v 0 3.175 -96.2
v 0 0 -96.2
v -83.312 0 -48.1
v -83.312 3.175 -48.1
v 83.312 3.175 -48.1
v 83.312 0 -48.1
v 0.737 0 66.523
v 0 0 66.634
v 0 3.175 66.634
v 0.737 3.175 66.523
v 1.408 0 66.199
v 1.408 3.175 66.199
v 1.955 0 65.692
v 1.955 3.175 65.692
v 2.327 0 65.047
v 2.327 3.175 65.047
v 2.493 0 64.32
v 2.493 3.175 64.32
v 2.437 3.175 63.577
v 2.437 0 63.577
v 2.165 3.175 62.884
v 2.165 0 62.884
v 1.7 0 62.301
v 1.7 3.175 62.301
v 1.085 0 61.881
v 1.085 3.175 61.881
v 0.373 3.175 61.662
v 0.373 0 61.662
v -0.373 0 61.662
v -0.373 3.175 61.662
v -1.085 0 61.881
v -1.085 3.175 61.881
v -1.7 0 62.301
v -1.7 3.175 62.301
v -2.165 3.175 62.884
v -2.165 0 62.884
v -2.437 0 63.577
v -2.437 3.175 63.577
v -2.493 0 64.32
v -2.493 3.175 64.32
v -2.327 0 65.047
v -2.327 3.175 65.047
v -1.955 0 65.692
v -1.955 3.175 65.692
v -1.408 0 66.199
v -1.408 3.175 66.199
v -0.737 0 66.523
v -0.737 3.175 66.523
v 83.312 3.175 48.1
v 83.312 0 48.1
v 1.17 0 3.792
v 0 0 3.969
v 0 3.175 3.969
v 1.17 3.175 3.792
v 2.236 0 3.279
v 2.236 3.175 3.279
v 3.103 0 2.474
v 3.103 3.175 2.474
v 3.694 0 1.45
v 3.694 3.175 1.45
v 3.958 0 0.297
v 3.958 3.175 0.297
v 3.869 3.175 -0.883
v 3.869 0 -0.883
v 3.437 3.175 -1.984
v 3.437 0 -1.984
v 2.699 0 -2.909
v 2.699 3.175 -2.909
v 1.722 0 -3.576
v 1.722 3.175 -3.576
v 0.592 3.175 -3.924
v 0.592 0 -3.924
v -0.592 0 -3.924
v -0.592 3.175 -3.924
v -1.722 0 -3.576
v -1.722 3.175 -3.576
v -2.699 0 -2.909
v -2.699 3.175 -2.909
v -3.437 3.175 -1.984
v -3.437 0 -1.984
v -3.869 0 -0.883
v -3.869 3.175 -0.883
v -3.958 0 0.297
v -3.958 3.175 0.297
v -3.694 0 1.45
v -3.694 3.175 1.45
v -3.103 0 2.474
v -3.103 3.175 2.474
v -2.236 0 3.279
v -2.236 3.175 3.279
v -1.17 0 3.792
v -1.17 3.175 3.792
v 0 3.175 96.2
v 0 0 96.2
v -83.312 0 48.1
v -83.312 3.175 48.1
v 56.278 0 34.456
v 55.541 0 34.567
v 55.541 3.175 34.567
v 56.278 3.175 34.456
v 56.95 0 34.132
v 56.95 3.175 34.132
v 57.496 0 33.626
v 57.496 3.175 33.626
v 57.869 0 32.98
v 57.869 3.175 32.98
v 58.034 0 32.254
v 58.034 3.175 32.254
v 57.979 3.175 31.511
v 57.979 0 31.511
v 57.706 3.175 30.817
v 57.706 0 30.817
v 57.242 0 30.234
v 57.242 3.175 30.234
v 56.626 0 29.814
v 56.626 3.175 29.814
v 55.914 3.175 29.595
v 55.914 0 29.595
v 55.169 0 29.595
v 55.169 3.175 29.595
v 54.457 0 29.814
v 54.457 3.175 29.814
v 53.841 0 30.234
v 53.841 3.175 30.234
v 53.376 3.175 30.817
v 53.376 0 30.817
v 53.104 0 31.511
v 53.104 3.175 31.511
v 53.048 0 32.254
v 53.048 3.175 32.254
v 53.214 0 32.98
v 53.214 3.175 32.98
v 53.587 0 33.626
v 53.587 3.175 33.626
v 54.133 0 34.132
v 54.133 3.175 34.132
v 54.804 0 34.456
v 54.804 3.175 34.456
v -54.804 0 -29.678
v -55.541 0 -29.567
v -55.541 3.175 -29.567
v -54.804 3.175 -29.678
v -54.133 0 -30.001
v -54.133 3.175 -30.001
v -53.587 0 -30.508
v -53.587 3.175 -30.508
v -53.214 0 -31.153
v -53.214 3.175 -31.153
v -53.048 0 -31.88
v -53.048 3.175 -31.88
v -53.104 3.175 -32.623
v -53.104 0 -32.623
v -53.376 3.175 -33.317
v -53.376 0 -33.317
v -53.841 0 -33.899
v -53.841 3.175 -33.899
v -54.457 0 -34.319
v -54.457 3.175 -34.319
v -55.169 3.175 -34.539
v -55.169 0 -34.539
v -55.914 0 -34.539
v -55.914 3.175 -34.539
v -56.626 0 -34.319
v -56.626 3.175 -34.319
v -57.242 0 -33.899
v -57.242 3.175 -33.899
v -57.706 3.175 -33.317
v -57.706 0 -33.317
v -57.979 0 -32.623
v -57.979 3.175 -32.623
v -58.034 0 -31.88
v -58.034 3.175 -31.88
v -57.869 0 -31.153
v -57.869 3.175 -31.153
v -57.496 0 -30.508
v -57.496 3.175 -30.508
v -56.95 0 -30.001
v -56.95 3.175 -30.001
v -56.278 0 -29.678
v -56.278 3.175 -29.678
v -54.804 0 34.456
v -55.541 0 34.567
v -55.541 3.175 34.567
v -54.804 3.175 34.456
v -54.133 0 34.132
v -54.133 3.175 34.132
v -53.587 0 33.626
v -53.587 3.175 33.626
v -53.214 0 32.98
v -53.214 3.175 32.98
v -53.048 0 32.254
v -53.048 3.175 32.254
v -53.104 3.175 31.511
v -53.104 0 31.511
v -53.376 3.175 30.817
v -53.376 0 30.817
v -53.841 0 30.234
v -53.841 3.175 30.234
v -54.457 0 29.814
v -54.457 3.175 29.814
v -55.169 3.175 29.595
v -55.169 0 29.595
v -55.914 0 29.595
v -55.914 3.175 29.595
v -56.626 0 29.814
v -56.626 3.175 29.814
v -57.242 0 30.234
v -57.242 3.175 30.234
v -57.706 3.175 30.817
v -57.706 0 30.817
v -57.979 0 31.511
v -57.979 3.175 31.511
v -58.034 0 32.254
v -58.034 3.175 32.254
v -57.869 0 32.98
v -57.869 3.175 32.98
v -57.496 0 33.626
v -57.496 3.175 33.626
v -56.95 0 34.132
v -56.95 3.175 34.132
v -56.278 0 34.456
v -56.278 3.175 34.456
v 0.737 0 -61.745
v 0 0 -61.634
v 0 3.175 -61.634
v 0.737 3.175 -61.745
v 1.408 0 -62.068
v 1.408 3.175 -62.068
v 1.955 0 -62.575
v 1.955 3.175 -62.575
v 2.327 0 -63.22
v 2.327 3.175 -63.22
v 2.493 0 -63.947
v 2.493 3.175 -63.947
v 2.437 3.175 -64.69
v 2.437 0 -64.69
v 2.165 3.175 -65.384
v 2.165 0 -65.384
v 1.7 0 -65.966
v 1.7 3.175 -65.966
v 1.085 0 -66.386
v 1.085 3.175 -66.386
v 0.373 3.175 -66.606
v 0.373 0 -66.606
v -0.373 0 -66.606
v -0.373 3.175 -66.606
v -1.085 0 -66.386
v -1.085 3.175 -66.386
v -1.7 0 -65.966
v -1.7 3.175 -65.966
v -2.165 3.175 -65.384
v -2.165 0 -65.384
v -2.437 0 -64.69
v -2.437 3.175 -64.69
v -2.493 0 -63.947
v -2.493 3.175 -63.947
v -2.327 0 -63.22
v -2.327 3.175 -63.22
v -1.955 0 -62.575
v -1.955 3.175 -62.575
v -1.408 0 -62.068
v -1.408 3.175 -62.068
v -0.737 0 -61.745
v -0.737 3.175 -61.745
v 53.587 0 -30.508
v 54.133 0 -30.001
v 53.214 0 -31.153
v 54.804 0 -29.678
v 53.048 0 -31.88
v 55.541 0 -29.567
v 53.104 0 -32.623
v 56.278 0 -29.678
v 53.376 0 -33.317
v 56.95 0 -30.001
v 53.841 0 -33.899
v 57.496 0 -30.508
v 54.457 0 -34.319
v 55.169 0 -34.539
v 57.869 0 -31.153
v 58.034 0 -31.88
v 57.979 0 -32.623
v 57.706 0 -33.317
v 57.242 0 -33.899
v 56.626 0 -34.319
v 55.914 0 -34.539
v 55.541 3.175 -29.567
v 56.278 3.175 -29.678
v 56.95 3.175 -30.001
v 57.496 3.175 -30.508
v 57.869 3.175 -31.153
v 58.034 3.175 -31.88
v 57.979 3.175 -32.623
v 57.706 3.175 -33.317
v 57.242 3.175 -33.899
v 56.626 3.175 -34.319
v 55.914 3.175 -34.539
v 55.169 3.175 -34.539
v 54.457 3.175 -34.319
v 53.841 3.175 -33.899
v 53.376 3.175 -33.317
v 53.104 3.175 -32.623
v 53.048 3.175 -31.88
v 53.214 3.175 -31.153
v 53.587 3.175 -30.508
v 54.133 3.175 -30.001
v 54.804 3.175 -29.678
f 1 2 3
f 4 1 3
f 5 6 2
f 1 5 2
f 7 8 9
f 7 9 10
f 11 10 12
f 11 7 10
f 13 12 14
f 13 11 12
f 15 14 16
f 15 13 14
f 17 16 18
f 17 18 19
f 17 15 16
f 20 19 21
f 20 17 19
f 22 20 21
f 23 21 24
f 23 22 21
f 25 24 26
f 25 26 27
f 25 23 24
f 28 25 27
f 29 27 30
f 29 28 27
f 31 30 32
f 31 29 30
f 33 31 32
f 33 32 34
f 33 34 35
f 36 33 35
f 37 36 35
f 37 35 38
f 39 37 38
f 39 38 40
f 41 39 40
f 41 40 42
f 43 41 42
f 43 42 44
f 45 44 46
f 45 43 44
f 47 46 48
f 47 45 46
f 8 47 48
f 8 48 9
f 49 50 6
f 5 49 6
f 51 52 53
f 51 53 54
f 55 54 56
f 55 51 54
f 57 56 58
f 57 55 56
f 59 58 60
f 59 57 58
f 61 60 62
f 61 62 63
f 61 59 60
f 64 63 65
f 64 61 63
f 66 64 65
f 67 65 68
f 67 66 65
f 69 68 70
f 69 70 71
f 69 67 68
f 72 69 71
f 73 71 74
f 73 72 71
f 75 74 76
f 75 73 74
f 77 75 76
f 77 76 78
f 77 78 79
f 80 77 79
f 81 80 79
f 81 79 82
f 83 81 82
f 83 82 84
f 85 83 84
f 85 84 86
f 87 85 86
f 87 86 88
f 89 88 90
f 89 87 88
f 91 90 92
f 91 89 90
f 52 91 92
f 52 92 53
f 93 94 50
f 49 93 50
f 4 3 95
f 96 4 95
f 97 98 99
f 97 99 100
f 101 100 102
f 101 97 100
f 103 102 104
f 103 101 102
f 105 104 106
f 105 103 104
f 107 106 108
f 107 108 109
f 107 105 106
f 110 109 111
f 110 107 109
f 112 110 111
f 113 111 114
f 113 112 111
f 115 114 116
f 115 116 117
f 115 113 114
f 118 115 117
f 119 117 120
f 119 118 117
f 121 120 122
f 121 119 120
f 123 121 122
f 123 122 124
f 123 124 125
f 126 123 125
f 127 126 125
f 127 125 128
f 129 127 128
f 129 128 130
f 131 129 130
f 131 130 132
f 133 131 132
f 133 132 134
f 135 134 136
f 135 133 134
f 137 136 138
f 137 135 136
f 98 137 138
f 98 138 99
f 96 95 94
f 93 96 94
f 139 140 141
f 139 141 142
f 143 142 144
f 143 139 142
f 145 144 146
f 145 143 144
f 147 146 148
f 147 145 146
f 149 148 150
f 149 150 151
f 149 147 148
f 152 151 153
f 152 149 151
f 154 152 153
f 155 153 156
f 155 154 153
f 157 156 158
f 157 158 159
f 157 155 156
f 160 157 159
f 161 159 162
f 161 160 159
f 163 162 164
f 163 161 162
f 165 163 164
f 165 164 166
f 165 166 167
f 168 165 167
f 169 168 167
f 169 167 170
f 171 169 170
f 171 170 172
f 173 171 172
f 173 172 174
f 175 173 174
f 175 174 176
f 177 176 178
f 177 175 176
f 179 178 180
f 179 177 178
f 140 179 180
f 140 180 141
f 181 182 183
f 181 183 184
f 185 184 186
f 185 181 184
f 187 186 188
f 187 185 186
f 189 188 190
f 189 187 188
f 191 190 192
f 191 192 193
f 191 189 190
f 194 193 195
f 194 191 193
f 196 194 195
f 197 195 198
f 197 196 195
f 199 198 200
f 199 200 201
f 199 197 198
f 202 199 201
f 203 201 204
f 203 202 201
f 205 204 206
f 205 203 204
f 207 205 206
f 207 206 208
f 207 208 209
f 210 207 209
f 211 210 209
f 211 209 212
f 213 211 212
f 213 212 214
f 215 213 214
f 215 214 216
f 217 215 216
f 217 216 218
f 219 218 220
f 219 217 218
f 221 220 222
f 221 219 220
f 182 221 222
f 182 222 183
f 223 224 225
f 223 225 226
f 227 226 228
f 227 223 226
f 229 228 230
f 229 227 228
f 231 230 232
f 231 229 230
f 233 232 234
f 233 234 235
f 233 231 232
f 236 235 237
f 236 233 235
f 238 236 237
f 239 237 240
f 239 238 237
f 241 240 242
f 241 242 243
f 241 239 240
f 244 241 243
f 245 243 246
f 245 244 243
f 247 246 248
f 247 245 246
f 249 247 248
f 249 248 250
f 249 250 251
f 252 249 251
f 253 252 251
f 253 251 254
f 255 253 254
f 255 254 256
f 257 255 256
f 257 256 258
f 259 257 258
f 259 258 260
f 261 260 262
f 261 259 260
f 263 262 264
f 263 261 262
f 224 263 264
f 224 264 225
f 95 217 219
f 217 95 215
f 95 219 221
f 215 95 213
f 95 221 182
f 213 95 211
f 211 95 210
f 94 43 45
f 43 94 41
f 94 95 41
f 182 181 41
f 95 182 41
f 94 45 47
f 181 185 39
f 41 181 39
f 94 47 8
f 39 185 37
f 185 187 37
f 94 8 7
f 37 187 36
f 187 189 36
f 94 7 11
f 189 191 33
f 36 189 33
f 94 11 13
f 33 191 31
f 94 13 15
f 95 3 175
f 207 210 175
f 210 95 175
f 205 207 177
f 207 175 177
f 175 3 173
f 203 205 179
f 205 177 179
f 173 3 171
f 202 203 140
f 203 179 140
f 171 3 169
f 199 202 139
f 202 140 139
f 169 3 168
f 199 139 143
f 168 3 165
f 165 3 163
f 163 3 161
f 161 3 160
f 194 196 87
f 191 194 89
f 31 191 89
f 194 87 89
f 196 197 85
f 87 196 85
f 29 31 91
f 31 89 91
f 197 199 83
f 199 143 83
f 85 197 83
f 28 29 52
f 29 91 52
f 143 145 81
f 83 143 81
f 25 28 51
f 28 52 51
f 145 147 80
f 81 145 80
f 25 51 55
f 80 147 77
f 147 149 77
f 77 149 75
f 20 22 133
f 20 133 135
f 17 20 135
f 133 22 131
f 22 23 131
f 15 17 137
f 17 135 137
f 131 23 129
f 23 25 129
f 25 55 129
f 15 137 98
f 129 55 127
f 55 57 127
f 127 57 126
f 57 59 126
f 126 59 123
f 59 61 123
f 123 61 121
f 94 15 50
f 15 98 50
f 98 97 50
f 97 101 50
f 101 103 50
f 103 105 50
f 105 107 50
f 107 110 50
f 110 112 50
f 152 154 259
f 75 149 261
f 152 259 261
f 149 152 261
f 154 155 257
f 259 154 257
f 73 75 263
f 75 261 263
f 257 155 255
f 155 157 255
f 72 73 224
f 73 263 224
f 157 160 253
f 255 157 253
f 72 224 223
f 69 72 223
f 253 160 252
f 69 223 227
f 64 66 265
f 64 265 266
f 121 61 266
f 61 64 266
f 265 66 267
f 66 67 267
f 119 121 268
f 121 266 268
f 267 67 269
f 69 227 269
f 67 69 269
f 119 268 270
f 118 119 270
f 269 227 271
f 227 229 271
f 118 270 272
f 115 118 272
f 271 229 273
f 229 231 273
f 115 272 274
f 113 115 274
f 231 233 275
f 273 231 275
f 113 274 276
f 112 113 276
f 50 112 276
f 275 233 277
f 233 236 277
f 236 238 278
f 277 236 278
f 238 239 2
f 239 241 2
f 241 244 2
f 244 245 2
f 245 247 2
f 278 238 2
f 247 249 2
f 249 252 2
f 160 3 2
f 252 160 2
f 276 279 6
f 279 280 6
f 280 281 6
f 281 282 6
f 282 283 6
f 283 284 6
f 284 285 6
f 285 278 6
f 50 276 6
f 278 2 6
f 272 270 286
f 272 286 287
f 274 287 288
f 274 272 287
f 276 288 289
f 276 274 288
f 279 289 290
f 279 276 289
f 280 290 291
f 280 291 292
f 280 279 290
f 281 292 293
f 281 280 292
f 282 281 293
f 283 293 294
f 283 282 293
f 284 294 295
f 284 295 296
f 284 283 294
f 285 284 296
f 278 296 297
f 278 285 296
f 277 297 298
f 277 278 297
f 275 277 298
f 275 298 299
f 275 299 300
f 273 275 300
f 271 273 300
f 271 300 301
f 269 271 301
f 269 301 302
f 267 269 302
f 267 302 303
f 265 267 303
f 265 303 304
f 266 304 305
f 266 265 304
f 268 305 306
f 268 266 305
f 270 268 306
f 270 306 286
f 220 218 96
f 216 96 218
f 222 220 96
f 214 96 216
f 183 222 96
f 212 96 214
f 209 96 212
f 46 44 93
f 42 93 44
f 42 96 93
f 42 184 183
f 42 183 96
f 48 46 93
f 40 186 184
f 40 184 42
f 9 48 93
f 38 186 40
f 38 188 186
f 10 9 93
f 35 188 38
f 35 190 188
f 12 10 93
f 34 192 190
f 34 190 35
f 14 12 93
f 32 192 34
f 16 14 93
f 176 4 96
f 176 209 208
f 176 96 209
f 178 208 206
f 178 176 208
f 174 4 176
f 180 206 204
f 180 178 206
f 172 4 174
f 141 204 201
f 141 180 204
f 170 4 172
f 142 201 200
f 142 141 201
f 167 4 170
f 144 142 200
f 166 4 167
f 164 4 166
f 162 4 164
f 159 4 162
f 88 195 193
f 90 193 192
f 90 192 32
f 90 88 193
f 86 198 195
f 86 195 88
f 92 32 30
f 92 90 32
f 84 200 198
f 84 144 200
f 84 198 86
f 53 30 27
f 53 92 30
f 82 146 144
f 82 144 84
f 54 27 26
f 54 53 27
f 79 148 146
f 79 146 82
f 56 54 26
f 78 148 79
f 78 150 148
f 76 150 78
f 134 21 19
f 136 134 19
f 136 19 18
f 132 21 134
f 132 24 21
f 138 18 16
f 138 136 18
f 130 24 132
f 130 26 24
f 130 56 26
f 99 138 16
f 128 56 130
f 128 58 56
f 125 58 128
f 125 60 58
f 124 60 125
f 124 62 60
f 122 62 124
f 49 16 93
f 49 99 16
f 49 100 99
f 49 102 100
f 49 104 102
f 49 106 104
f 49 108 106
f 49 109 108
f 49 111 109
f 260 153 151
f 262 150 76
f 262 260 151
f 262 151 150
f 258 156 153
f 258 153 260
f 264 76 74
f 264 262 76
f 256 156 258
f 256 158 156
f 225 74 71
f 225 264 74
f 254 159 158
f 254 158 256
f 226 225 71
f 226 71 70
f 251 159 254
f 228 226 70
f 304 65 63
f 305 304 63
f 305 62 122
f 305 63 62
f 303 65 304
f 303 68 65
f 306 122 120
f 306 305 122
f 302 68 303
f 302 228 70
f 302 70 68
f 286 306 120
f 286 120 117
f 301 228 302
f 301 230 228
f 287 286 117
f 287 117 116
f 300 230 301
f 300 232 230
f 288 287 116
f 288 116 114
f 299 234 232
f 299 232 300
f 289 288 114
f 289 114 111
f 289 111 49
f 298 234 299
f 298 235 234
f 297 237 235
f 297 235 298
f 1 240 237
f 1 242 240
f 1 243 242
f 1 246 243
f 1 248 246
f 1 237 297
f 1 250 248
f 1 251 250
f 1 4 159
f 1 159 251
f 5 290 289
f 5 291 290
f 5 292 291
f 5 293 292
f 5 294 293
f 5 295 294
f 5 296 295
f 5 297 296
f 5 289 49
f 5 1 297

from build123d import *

# Parameters (mm, degrees)
SKETCH2_R           = 2.5
SKETCH2_R_2         = 3.96875
BOSS_EXTRUDE1_DEPTH = 3.175


with BuildPart() as part:
    # Sketch2 → Boss-Extrude1 (new body)
    with BuildSketch(Plane(origin=(0, 0, 0), x_dir=(1, 0, 0), z_dir=(0, 1, 0))):
        Polygon((0, 96.200411253), (-41.656, 72.15030844), (-83.312, 48.100205627), (-83.312, -48.100205627), (0, -96.200411253), (83.312, -48.100205627), (83.312, 48.100205627), align=None)
        with Locations((-55.541333303, -32.066803734)):
            Circle(SKETCH2_R, mode=Mode.SUBTRACT)
        with Locations((0, -64.133607467)):
            Circle(SKETCH2_R, mode=Mode.SUBTRACT)
        with Locations((55.541333303, -32.066803734)):
            Circle(SKETCH2_R, mode=Mode.SUBTRACT)
        with Locations((-55.541333303, 32.066803734)):
            Circle(SKETCH2_R, mode=Mode.SUBTRACT)
        Circle(SKETCH2_R_2, mode=Mode.SUBTRACT)
        with Locations((0, 64.133607467)):
            Circle(SKETCH2_R, mode=Mode.SUBTRACT)
        with Locations((55.541333303, 32.066803734)):
            Circle(SKETCH2_R, mode=Mode.SUBTRACT)
    extrude(amount=BOSS_EXTRUDE1_DEPTH)


solid = part.part
